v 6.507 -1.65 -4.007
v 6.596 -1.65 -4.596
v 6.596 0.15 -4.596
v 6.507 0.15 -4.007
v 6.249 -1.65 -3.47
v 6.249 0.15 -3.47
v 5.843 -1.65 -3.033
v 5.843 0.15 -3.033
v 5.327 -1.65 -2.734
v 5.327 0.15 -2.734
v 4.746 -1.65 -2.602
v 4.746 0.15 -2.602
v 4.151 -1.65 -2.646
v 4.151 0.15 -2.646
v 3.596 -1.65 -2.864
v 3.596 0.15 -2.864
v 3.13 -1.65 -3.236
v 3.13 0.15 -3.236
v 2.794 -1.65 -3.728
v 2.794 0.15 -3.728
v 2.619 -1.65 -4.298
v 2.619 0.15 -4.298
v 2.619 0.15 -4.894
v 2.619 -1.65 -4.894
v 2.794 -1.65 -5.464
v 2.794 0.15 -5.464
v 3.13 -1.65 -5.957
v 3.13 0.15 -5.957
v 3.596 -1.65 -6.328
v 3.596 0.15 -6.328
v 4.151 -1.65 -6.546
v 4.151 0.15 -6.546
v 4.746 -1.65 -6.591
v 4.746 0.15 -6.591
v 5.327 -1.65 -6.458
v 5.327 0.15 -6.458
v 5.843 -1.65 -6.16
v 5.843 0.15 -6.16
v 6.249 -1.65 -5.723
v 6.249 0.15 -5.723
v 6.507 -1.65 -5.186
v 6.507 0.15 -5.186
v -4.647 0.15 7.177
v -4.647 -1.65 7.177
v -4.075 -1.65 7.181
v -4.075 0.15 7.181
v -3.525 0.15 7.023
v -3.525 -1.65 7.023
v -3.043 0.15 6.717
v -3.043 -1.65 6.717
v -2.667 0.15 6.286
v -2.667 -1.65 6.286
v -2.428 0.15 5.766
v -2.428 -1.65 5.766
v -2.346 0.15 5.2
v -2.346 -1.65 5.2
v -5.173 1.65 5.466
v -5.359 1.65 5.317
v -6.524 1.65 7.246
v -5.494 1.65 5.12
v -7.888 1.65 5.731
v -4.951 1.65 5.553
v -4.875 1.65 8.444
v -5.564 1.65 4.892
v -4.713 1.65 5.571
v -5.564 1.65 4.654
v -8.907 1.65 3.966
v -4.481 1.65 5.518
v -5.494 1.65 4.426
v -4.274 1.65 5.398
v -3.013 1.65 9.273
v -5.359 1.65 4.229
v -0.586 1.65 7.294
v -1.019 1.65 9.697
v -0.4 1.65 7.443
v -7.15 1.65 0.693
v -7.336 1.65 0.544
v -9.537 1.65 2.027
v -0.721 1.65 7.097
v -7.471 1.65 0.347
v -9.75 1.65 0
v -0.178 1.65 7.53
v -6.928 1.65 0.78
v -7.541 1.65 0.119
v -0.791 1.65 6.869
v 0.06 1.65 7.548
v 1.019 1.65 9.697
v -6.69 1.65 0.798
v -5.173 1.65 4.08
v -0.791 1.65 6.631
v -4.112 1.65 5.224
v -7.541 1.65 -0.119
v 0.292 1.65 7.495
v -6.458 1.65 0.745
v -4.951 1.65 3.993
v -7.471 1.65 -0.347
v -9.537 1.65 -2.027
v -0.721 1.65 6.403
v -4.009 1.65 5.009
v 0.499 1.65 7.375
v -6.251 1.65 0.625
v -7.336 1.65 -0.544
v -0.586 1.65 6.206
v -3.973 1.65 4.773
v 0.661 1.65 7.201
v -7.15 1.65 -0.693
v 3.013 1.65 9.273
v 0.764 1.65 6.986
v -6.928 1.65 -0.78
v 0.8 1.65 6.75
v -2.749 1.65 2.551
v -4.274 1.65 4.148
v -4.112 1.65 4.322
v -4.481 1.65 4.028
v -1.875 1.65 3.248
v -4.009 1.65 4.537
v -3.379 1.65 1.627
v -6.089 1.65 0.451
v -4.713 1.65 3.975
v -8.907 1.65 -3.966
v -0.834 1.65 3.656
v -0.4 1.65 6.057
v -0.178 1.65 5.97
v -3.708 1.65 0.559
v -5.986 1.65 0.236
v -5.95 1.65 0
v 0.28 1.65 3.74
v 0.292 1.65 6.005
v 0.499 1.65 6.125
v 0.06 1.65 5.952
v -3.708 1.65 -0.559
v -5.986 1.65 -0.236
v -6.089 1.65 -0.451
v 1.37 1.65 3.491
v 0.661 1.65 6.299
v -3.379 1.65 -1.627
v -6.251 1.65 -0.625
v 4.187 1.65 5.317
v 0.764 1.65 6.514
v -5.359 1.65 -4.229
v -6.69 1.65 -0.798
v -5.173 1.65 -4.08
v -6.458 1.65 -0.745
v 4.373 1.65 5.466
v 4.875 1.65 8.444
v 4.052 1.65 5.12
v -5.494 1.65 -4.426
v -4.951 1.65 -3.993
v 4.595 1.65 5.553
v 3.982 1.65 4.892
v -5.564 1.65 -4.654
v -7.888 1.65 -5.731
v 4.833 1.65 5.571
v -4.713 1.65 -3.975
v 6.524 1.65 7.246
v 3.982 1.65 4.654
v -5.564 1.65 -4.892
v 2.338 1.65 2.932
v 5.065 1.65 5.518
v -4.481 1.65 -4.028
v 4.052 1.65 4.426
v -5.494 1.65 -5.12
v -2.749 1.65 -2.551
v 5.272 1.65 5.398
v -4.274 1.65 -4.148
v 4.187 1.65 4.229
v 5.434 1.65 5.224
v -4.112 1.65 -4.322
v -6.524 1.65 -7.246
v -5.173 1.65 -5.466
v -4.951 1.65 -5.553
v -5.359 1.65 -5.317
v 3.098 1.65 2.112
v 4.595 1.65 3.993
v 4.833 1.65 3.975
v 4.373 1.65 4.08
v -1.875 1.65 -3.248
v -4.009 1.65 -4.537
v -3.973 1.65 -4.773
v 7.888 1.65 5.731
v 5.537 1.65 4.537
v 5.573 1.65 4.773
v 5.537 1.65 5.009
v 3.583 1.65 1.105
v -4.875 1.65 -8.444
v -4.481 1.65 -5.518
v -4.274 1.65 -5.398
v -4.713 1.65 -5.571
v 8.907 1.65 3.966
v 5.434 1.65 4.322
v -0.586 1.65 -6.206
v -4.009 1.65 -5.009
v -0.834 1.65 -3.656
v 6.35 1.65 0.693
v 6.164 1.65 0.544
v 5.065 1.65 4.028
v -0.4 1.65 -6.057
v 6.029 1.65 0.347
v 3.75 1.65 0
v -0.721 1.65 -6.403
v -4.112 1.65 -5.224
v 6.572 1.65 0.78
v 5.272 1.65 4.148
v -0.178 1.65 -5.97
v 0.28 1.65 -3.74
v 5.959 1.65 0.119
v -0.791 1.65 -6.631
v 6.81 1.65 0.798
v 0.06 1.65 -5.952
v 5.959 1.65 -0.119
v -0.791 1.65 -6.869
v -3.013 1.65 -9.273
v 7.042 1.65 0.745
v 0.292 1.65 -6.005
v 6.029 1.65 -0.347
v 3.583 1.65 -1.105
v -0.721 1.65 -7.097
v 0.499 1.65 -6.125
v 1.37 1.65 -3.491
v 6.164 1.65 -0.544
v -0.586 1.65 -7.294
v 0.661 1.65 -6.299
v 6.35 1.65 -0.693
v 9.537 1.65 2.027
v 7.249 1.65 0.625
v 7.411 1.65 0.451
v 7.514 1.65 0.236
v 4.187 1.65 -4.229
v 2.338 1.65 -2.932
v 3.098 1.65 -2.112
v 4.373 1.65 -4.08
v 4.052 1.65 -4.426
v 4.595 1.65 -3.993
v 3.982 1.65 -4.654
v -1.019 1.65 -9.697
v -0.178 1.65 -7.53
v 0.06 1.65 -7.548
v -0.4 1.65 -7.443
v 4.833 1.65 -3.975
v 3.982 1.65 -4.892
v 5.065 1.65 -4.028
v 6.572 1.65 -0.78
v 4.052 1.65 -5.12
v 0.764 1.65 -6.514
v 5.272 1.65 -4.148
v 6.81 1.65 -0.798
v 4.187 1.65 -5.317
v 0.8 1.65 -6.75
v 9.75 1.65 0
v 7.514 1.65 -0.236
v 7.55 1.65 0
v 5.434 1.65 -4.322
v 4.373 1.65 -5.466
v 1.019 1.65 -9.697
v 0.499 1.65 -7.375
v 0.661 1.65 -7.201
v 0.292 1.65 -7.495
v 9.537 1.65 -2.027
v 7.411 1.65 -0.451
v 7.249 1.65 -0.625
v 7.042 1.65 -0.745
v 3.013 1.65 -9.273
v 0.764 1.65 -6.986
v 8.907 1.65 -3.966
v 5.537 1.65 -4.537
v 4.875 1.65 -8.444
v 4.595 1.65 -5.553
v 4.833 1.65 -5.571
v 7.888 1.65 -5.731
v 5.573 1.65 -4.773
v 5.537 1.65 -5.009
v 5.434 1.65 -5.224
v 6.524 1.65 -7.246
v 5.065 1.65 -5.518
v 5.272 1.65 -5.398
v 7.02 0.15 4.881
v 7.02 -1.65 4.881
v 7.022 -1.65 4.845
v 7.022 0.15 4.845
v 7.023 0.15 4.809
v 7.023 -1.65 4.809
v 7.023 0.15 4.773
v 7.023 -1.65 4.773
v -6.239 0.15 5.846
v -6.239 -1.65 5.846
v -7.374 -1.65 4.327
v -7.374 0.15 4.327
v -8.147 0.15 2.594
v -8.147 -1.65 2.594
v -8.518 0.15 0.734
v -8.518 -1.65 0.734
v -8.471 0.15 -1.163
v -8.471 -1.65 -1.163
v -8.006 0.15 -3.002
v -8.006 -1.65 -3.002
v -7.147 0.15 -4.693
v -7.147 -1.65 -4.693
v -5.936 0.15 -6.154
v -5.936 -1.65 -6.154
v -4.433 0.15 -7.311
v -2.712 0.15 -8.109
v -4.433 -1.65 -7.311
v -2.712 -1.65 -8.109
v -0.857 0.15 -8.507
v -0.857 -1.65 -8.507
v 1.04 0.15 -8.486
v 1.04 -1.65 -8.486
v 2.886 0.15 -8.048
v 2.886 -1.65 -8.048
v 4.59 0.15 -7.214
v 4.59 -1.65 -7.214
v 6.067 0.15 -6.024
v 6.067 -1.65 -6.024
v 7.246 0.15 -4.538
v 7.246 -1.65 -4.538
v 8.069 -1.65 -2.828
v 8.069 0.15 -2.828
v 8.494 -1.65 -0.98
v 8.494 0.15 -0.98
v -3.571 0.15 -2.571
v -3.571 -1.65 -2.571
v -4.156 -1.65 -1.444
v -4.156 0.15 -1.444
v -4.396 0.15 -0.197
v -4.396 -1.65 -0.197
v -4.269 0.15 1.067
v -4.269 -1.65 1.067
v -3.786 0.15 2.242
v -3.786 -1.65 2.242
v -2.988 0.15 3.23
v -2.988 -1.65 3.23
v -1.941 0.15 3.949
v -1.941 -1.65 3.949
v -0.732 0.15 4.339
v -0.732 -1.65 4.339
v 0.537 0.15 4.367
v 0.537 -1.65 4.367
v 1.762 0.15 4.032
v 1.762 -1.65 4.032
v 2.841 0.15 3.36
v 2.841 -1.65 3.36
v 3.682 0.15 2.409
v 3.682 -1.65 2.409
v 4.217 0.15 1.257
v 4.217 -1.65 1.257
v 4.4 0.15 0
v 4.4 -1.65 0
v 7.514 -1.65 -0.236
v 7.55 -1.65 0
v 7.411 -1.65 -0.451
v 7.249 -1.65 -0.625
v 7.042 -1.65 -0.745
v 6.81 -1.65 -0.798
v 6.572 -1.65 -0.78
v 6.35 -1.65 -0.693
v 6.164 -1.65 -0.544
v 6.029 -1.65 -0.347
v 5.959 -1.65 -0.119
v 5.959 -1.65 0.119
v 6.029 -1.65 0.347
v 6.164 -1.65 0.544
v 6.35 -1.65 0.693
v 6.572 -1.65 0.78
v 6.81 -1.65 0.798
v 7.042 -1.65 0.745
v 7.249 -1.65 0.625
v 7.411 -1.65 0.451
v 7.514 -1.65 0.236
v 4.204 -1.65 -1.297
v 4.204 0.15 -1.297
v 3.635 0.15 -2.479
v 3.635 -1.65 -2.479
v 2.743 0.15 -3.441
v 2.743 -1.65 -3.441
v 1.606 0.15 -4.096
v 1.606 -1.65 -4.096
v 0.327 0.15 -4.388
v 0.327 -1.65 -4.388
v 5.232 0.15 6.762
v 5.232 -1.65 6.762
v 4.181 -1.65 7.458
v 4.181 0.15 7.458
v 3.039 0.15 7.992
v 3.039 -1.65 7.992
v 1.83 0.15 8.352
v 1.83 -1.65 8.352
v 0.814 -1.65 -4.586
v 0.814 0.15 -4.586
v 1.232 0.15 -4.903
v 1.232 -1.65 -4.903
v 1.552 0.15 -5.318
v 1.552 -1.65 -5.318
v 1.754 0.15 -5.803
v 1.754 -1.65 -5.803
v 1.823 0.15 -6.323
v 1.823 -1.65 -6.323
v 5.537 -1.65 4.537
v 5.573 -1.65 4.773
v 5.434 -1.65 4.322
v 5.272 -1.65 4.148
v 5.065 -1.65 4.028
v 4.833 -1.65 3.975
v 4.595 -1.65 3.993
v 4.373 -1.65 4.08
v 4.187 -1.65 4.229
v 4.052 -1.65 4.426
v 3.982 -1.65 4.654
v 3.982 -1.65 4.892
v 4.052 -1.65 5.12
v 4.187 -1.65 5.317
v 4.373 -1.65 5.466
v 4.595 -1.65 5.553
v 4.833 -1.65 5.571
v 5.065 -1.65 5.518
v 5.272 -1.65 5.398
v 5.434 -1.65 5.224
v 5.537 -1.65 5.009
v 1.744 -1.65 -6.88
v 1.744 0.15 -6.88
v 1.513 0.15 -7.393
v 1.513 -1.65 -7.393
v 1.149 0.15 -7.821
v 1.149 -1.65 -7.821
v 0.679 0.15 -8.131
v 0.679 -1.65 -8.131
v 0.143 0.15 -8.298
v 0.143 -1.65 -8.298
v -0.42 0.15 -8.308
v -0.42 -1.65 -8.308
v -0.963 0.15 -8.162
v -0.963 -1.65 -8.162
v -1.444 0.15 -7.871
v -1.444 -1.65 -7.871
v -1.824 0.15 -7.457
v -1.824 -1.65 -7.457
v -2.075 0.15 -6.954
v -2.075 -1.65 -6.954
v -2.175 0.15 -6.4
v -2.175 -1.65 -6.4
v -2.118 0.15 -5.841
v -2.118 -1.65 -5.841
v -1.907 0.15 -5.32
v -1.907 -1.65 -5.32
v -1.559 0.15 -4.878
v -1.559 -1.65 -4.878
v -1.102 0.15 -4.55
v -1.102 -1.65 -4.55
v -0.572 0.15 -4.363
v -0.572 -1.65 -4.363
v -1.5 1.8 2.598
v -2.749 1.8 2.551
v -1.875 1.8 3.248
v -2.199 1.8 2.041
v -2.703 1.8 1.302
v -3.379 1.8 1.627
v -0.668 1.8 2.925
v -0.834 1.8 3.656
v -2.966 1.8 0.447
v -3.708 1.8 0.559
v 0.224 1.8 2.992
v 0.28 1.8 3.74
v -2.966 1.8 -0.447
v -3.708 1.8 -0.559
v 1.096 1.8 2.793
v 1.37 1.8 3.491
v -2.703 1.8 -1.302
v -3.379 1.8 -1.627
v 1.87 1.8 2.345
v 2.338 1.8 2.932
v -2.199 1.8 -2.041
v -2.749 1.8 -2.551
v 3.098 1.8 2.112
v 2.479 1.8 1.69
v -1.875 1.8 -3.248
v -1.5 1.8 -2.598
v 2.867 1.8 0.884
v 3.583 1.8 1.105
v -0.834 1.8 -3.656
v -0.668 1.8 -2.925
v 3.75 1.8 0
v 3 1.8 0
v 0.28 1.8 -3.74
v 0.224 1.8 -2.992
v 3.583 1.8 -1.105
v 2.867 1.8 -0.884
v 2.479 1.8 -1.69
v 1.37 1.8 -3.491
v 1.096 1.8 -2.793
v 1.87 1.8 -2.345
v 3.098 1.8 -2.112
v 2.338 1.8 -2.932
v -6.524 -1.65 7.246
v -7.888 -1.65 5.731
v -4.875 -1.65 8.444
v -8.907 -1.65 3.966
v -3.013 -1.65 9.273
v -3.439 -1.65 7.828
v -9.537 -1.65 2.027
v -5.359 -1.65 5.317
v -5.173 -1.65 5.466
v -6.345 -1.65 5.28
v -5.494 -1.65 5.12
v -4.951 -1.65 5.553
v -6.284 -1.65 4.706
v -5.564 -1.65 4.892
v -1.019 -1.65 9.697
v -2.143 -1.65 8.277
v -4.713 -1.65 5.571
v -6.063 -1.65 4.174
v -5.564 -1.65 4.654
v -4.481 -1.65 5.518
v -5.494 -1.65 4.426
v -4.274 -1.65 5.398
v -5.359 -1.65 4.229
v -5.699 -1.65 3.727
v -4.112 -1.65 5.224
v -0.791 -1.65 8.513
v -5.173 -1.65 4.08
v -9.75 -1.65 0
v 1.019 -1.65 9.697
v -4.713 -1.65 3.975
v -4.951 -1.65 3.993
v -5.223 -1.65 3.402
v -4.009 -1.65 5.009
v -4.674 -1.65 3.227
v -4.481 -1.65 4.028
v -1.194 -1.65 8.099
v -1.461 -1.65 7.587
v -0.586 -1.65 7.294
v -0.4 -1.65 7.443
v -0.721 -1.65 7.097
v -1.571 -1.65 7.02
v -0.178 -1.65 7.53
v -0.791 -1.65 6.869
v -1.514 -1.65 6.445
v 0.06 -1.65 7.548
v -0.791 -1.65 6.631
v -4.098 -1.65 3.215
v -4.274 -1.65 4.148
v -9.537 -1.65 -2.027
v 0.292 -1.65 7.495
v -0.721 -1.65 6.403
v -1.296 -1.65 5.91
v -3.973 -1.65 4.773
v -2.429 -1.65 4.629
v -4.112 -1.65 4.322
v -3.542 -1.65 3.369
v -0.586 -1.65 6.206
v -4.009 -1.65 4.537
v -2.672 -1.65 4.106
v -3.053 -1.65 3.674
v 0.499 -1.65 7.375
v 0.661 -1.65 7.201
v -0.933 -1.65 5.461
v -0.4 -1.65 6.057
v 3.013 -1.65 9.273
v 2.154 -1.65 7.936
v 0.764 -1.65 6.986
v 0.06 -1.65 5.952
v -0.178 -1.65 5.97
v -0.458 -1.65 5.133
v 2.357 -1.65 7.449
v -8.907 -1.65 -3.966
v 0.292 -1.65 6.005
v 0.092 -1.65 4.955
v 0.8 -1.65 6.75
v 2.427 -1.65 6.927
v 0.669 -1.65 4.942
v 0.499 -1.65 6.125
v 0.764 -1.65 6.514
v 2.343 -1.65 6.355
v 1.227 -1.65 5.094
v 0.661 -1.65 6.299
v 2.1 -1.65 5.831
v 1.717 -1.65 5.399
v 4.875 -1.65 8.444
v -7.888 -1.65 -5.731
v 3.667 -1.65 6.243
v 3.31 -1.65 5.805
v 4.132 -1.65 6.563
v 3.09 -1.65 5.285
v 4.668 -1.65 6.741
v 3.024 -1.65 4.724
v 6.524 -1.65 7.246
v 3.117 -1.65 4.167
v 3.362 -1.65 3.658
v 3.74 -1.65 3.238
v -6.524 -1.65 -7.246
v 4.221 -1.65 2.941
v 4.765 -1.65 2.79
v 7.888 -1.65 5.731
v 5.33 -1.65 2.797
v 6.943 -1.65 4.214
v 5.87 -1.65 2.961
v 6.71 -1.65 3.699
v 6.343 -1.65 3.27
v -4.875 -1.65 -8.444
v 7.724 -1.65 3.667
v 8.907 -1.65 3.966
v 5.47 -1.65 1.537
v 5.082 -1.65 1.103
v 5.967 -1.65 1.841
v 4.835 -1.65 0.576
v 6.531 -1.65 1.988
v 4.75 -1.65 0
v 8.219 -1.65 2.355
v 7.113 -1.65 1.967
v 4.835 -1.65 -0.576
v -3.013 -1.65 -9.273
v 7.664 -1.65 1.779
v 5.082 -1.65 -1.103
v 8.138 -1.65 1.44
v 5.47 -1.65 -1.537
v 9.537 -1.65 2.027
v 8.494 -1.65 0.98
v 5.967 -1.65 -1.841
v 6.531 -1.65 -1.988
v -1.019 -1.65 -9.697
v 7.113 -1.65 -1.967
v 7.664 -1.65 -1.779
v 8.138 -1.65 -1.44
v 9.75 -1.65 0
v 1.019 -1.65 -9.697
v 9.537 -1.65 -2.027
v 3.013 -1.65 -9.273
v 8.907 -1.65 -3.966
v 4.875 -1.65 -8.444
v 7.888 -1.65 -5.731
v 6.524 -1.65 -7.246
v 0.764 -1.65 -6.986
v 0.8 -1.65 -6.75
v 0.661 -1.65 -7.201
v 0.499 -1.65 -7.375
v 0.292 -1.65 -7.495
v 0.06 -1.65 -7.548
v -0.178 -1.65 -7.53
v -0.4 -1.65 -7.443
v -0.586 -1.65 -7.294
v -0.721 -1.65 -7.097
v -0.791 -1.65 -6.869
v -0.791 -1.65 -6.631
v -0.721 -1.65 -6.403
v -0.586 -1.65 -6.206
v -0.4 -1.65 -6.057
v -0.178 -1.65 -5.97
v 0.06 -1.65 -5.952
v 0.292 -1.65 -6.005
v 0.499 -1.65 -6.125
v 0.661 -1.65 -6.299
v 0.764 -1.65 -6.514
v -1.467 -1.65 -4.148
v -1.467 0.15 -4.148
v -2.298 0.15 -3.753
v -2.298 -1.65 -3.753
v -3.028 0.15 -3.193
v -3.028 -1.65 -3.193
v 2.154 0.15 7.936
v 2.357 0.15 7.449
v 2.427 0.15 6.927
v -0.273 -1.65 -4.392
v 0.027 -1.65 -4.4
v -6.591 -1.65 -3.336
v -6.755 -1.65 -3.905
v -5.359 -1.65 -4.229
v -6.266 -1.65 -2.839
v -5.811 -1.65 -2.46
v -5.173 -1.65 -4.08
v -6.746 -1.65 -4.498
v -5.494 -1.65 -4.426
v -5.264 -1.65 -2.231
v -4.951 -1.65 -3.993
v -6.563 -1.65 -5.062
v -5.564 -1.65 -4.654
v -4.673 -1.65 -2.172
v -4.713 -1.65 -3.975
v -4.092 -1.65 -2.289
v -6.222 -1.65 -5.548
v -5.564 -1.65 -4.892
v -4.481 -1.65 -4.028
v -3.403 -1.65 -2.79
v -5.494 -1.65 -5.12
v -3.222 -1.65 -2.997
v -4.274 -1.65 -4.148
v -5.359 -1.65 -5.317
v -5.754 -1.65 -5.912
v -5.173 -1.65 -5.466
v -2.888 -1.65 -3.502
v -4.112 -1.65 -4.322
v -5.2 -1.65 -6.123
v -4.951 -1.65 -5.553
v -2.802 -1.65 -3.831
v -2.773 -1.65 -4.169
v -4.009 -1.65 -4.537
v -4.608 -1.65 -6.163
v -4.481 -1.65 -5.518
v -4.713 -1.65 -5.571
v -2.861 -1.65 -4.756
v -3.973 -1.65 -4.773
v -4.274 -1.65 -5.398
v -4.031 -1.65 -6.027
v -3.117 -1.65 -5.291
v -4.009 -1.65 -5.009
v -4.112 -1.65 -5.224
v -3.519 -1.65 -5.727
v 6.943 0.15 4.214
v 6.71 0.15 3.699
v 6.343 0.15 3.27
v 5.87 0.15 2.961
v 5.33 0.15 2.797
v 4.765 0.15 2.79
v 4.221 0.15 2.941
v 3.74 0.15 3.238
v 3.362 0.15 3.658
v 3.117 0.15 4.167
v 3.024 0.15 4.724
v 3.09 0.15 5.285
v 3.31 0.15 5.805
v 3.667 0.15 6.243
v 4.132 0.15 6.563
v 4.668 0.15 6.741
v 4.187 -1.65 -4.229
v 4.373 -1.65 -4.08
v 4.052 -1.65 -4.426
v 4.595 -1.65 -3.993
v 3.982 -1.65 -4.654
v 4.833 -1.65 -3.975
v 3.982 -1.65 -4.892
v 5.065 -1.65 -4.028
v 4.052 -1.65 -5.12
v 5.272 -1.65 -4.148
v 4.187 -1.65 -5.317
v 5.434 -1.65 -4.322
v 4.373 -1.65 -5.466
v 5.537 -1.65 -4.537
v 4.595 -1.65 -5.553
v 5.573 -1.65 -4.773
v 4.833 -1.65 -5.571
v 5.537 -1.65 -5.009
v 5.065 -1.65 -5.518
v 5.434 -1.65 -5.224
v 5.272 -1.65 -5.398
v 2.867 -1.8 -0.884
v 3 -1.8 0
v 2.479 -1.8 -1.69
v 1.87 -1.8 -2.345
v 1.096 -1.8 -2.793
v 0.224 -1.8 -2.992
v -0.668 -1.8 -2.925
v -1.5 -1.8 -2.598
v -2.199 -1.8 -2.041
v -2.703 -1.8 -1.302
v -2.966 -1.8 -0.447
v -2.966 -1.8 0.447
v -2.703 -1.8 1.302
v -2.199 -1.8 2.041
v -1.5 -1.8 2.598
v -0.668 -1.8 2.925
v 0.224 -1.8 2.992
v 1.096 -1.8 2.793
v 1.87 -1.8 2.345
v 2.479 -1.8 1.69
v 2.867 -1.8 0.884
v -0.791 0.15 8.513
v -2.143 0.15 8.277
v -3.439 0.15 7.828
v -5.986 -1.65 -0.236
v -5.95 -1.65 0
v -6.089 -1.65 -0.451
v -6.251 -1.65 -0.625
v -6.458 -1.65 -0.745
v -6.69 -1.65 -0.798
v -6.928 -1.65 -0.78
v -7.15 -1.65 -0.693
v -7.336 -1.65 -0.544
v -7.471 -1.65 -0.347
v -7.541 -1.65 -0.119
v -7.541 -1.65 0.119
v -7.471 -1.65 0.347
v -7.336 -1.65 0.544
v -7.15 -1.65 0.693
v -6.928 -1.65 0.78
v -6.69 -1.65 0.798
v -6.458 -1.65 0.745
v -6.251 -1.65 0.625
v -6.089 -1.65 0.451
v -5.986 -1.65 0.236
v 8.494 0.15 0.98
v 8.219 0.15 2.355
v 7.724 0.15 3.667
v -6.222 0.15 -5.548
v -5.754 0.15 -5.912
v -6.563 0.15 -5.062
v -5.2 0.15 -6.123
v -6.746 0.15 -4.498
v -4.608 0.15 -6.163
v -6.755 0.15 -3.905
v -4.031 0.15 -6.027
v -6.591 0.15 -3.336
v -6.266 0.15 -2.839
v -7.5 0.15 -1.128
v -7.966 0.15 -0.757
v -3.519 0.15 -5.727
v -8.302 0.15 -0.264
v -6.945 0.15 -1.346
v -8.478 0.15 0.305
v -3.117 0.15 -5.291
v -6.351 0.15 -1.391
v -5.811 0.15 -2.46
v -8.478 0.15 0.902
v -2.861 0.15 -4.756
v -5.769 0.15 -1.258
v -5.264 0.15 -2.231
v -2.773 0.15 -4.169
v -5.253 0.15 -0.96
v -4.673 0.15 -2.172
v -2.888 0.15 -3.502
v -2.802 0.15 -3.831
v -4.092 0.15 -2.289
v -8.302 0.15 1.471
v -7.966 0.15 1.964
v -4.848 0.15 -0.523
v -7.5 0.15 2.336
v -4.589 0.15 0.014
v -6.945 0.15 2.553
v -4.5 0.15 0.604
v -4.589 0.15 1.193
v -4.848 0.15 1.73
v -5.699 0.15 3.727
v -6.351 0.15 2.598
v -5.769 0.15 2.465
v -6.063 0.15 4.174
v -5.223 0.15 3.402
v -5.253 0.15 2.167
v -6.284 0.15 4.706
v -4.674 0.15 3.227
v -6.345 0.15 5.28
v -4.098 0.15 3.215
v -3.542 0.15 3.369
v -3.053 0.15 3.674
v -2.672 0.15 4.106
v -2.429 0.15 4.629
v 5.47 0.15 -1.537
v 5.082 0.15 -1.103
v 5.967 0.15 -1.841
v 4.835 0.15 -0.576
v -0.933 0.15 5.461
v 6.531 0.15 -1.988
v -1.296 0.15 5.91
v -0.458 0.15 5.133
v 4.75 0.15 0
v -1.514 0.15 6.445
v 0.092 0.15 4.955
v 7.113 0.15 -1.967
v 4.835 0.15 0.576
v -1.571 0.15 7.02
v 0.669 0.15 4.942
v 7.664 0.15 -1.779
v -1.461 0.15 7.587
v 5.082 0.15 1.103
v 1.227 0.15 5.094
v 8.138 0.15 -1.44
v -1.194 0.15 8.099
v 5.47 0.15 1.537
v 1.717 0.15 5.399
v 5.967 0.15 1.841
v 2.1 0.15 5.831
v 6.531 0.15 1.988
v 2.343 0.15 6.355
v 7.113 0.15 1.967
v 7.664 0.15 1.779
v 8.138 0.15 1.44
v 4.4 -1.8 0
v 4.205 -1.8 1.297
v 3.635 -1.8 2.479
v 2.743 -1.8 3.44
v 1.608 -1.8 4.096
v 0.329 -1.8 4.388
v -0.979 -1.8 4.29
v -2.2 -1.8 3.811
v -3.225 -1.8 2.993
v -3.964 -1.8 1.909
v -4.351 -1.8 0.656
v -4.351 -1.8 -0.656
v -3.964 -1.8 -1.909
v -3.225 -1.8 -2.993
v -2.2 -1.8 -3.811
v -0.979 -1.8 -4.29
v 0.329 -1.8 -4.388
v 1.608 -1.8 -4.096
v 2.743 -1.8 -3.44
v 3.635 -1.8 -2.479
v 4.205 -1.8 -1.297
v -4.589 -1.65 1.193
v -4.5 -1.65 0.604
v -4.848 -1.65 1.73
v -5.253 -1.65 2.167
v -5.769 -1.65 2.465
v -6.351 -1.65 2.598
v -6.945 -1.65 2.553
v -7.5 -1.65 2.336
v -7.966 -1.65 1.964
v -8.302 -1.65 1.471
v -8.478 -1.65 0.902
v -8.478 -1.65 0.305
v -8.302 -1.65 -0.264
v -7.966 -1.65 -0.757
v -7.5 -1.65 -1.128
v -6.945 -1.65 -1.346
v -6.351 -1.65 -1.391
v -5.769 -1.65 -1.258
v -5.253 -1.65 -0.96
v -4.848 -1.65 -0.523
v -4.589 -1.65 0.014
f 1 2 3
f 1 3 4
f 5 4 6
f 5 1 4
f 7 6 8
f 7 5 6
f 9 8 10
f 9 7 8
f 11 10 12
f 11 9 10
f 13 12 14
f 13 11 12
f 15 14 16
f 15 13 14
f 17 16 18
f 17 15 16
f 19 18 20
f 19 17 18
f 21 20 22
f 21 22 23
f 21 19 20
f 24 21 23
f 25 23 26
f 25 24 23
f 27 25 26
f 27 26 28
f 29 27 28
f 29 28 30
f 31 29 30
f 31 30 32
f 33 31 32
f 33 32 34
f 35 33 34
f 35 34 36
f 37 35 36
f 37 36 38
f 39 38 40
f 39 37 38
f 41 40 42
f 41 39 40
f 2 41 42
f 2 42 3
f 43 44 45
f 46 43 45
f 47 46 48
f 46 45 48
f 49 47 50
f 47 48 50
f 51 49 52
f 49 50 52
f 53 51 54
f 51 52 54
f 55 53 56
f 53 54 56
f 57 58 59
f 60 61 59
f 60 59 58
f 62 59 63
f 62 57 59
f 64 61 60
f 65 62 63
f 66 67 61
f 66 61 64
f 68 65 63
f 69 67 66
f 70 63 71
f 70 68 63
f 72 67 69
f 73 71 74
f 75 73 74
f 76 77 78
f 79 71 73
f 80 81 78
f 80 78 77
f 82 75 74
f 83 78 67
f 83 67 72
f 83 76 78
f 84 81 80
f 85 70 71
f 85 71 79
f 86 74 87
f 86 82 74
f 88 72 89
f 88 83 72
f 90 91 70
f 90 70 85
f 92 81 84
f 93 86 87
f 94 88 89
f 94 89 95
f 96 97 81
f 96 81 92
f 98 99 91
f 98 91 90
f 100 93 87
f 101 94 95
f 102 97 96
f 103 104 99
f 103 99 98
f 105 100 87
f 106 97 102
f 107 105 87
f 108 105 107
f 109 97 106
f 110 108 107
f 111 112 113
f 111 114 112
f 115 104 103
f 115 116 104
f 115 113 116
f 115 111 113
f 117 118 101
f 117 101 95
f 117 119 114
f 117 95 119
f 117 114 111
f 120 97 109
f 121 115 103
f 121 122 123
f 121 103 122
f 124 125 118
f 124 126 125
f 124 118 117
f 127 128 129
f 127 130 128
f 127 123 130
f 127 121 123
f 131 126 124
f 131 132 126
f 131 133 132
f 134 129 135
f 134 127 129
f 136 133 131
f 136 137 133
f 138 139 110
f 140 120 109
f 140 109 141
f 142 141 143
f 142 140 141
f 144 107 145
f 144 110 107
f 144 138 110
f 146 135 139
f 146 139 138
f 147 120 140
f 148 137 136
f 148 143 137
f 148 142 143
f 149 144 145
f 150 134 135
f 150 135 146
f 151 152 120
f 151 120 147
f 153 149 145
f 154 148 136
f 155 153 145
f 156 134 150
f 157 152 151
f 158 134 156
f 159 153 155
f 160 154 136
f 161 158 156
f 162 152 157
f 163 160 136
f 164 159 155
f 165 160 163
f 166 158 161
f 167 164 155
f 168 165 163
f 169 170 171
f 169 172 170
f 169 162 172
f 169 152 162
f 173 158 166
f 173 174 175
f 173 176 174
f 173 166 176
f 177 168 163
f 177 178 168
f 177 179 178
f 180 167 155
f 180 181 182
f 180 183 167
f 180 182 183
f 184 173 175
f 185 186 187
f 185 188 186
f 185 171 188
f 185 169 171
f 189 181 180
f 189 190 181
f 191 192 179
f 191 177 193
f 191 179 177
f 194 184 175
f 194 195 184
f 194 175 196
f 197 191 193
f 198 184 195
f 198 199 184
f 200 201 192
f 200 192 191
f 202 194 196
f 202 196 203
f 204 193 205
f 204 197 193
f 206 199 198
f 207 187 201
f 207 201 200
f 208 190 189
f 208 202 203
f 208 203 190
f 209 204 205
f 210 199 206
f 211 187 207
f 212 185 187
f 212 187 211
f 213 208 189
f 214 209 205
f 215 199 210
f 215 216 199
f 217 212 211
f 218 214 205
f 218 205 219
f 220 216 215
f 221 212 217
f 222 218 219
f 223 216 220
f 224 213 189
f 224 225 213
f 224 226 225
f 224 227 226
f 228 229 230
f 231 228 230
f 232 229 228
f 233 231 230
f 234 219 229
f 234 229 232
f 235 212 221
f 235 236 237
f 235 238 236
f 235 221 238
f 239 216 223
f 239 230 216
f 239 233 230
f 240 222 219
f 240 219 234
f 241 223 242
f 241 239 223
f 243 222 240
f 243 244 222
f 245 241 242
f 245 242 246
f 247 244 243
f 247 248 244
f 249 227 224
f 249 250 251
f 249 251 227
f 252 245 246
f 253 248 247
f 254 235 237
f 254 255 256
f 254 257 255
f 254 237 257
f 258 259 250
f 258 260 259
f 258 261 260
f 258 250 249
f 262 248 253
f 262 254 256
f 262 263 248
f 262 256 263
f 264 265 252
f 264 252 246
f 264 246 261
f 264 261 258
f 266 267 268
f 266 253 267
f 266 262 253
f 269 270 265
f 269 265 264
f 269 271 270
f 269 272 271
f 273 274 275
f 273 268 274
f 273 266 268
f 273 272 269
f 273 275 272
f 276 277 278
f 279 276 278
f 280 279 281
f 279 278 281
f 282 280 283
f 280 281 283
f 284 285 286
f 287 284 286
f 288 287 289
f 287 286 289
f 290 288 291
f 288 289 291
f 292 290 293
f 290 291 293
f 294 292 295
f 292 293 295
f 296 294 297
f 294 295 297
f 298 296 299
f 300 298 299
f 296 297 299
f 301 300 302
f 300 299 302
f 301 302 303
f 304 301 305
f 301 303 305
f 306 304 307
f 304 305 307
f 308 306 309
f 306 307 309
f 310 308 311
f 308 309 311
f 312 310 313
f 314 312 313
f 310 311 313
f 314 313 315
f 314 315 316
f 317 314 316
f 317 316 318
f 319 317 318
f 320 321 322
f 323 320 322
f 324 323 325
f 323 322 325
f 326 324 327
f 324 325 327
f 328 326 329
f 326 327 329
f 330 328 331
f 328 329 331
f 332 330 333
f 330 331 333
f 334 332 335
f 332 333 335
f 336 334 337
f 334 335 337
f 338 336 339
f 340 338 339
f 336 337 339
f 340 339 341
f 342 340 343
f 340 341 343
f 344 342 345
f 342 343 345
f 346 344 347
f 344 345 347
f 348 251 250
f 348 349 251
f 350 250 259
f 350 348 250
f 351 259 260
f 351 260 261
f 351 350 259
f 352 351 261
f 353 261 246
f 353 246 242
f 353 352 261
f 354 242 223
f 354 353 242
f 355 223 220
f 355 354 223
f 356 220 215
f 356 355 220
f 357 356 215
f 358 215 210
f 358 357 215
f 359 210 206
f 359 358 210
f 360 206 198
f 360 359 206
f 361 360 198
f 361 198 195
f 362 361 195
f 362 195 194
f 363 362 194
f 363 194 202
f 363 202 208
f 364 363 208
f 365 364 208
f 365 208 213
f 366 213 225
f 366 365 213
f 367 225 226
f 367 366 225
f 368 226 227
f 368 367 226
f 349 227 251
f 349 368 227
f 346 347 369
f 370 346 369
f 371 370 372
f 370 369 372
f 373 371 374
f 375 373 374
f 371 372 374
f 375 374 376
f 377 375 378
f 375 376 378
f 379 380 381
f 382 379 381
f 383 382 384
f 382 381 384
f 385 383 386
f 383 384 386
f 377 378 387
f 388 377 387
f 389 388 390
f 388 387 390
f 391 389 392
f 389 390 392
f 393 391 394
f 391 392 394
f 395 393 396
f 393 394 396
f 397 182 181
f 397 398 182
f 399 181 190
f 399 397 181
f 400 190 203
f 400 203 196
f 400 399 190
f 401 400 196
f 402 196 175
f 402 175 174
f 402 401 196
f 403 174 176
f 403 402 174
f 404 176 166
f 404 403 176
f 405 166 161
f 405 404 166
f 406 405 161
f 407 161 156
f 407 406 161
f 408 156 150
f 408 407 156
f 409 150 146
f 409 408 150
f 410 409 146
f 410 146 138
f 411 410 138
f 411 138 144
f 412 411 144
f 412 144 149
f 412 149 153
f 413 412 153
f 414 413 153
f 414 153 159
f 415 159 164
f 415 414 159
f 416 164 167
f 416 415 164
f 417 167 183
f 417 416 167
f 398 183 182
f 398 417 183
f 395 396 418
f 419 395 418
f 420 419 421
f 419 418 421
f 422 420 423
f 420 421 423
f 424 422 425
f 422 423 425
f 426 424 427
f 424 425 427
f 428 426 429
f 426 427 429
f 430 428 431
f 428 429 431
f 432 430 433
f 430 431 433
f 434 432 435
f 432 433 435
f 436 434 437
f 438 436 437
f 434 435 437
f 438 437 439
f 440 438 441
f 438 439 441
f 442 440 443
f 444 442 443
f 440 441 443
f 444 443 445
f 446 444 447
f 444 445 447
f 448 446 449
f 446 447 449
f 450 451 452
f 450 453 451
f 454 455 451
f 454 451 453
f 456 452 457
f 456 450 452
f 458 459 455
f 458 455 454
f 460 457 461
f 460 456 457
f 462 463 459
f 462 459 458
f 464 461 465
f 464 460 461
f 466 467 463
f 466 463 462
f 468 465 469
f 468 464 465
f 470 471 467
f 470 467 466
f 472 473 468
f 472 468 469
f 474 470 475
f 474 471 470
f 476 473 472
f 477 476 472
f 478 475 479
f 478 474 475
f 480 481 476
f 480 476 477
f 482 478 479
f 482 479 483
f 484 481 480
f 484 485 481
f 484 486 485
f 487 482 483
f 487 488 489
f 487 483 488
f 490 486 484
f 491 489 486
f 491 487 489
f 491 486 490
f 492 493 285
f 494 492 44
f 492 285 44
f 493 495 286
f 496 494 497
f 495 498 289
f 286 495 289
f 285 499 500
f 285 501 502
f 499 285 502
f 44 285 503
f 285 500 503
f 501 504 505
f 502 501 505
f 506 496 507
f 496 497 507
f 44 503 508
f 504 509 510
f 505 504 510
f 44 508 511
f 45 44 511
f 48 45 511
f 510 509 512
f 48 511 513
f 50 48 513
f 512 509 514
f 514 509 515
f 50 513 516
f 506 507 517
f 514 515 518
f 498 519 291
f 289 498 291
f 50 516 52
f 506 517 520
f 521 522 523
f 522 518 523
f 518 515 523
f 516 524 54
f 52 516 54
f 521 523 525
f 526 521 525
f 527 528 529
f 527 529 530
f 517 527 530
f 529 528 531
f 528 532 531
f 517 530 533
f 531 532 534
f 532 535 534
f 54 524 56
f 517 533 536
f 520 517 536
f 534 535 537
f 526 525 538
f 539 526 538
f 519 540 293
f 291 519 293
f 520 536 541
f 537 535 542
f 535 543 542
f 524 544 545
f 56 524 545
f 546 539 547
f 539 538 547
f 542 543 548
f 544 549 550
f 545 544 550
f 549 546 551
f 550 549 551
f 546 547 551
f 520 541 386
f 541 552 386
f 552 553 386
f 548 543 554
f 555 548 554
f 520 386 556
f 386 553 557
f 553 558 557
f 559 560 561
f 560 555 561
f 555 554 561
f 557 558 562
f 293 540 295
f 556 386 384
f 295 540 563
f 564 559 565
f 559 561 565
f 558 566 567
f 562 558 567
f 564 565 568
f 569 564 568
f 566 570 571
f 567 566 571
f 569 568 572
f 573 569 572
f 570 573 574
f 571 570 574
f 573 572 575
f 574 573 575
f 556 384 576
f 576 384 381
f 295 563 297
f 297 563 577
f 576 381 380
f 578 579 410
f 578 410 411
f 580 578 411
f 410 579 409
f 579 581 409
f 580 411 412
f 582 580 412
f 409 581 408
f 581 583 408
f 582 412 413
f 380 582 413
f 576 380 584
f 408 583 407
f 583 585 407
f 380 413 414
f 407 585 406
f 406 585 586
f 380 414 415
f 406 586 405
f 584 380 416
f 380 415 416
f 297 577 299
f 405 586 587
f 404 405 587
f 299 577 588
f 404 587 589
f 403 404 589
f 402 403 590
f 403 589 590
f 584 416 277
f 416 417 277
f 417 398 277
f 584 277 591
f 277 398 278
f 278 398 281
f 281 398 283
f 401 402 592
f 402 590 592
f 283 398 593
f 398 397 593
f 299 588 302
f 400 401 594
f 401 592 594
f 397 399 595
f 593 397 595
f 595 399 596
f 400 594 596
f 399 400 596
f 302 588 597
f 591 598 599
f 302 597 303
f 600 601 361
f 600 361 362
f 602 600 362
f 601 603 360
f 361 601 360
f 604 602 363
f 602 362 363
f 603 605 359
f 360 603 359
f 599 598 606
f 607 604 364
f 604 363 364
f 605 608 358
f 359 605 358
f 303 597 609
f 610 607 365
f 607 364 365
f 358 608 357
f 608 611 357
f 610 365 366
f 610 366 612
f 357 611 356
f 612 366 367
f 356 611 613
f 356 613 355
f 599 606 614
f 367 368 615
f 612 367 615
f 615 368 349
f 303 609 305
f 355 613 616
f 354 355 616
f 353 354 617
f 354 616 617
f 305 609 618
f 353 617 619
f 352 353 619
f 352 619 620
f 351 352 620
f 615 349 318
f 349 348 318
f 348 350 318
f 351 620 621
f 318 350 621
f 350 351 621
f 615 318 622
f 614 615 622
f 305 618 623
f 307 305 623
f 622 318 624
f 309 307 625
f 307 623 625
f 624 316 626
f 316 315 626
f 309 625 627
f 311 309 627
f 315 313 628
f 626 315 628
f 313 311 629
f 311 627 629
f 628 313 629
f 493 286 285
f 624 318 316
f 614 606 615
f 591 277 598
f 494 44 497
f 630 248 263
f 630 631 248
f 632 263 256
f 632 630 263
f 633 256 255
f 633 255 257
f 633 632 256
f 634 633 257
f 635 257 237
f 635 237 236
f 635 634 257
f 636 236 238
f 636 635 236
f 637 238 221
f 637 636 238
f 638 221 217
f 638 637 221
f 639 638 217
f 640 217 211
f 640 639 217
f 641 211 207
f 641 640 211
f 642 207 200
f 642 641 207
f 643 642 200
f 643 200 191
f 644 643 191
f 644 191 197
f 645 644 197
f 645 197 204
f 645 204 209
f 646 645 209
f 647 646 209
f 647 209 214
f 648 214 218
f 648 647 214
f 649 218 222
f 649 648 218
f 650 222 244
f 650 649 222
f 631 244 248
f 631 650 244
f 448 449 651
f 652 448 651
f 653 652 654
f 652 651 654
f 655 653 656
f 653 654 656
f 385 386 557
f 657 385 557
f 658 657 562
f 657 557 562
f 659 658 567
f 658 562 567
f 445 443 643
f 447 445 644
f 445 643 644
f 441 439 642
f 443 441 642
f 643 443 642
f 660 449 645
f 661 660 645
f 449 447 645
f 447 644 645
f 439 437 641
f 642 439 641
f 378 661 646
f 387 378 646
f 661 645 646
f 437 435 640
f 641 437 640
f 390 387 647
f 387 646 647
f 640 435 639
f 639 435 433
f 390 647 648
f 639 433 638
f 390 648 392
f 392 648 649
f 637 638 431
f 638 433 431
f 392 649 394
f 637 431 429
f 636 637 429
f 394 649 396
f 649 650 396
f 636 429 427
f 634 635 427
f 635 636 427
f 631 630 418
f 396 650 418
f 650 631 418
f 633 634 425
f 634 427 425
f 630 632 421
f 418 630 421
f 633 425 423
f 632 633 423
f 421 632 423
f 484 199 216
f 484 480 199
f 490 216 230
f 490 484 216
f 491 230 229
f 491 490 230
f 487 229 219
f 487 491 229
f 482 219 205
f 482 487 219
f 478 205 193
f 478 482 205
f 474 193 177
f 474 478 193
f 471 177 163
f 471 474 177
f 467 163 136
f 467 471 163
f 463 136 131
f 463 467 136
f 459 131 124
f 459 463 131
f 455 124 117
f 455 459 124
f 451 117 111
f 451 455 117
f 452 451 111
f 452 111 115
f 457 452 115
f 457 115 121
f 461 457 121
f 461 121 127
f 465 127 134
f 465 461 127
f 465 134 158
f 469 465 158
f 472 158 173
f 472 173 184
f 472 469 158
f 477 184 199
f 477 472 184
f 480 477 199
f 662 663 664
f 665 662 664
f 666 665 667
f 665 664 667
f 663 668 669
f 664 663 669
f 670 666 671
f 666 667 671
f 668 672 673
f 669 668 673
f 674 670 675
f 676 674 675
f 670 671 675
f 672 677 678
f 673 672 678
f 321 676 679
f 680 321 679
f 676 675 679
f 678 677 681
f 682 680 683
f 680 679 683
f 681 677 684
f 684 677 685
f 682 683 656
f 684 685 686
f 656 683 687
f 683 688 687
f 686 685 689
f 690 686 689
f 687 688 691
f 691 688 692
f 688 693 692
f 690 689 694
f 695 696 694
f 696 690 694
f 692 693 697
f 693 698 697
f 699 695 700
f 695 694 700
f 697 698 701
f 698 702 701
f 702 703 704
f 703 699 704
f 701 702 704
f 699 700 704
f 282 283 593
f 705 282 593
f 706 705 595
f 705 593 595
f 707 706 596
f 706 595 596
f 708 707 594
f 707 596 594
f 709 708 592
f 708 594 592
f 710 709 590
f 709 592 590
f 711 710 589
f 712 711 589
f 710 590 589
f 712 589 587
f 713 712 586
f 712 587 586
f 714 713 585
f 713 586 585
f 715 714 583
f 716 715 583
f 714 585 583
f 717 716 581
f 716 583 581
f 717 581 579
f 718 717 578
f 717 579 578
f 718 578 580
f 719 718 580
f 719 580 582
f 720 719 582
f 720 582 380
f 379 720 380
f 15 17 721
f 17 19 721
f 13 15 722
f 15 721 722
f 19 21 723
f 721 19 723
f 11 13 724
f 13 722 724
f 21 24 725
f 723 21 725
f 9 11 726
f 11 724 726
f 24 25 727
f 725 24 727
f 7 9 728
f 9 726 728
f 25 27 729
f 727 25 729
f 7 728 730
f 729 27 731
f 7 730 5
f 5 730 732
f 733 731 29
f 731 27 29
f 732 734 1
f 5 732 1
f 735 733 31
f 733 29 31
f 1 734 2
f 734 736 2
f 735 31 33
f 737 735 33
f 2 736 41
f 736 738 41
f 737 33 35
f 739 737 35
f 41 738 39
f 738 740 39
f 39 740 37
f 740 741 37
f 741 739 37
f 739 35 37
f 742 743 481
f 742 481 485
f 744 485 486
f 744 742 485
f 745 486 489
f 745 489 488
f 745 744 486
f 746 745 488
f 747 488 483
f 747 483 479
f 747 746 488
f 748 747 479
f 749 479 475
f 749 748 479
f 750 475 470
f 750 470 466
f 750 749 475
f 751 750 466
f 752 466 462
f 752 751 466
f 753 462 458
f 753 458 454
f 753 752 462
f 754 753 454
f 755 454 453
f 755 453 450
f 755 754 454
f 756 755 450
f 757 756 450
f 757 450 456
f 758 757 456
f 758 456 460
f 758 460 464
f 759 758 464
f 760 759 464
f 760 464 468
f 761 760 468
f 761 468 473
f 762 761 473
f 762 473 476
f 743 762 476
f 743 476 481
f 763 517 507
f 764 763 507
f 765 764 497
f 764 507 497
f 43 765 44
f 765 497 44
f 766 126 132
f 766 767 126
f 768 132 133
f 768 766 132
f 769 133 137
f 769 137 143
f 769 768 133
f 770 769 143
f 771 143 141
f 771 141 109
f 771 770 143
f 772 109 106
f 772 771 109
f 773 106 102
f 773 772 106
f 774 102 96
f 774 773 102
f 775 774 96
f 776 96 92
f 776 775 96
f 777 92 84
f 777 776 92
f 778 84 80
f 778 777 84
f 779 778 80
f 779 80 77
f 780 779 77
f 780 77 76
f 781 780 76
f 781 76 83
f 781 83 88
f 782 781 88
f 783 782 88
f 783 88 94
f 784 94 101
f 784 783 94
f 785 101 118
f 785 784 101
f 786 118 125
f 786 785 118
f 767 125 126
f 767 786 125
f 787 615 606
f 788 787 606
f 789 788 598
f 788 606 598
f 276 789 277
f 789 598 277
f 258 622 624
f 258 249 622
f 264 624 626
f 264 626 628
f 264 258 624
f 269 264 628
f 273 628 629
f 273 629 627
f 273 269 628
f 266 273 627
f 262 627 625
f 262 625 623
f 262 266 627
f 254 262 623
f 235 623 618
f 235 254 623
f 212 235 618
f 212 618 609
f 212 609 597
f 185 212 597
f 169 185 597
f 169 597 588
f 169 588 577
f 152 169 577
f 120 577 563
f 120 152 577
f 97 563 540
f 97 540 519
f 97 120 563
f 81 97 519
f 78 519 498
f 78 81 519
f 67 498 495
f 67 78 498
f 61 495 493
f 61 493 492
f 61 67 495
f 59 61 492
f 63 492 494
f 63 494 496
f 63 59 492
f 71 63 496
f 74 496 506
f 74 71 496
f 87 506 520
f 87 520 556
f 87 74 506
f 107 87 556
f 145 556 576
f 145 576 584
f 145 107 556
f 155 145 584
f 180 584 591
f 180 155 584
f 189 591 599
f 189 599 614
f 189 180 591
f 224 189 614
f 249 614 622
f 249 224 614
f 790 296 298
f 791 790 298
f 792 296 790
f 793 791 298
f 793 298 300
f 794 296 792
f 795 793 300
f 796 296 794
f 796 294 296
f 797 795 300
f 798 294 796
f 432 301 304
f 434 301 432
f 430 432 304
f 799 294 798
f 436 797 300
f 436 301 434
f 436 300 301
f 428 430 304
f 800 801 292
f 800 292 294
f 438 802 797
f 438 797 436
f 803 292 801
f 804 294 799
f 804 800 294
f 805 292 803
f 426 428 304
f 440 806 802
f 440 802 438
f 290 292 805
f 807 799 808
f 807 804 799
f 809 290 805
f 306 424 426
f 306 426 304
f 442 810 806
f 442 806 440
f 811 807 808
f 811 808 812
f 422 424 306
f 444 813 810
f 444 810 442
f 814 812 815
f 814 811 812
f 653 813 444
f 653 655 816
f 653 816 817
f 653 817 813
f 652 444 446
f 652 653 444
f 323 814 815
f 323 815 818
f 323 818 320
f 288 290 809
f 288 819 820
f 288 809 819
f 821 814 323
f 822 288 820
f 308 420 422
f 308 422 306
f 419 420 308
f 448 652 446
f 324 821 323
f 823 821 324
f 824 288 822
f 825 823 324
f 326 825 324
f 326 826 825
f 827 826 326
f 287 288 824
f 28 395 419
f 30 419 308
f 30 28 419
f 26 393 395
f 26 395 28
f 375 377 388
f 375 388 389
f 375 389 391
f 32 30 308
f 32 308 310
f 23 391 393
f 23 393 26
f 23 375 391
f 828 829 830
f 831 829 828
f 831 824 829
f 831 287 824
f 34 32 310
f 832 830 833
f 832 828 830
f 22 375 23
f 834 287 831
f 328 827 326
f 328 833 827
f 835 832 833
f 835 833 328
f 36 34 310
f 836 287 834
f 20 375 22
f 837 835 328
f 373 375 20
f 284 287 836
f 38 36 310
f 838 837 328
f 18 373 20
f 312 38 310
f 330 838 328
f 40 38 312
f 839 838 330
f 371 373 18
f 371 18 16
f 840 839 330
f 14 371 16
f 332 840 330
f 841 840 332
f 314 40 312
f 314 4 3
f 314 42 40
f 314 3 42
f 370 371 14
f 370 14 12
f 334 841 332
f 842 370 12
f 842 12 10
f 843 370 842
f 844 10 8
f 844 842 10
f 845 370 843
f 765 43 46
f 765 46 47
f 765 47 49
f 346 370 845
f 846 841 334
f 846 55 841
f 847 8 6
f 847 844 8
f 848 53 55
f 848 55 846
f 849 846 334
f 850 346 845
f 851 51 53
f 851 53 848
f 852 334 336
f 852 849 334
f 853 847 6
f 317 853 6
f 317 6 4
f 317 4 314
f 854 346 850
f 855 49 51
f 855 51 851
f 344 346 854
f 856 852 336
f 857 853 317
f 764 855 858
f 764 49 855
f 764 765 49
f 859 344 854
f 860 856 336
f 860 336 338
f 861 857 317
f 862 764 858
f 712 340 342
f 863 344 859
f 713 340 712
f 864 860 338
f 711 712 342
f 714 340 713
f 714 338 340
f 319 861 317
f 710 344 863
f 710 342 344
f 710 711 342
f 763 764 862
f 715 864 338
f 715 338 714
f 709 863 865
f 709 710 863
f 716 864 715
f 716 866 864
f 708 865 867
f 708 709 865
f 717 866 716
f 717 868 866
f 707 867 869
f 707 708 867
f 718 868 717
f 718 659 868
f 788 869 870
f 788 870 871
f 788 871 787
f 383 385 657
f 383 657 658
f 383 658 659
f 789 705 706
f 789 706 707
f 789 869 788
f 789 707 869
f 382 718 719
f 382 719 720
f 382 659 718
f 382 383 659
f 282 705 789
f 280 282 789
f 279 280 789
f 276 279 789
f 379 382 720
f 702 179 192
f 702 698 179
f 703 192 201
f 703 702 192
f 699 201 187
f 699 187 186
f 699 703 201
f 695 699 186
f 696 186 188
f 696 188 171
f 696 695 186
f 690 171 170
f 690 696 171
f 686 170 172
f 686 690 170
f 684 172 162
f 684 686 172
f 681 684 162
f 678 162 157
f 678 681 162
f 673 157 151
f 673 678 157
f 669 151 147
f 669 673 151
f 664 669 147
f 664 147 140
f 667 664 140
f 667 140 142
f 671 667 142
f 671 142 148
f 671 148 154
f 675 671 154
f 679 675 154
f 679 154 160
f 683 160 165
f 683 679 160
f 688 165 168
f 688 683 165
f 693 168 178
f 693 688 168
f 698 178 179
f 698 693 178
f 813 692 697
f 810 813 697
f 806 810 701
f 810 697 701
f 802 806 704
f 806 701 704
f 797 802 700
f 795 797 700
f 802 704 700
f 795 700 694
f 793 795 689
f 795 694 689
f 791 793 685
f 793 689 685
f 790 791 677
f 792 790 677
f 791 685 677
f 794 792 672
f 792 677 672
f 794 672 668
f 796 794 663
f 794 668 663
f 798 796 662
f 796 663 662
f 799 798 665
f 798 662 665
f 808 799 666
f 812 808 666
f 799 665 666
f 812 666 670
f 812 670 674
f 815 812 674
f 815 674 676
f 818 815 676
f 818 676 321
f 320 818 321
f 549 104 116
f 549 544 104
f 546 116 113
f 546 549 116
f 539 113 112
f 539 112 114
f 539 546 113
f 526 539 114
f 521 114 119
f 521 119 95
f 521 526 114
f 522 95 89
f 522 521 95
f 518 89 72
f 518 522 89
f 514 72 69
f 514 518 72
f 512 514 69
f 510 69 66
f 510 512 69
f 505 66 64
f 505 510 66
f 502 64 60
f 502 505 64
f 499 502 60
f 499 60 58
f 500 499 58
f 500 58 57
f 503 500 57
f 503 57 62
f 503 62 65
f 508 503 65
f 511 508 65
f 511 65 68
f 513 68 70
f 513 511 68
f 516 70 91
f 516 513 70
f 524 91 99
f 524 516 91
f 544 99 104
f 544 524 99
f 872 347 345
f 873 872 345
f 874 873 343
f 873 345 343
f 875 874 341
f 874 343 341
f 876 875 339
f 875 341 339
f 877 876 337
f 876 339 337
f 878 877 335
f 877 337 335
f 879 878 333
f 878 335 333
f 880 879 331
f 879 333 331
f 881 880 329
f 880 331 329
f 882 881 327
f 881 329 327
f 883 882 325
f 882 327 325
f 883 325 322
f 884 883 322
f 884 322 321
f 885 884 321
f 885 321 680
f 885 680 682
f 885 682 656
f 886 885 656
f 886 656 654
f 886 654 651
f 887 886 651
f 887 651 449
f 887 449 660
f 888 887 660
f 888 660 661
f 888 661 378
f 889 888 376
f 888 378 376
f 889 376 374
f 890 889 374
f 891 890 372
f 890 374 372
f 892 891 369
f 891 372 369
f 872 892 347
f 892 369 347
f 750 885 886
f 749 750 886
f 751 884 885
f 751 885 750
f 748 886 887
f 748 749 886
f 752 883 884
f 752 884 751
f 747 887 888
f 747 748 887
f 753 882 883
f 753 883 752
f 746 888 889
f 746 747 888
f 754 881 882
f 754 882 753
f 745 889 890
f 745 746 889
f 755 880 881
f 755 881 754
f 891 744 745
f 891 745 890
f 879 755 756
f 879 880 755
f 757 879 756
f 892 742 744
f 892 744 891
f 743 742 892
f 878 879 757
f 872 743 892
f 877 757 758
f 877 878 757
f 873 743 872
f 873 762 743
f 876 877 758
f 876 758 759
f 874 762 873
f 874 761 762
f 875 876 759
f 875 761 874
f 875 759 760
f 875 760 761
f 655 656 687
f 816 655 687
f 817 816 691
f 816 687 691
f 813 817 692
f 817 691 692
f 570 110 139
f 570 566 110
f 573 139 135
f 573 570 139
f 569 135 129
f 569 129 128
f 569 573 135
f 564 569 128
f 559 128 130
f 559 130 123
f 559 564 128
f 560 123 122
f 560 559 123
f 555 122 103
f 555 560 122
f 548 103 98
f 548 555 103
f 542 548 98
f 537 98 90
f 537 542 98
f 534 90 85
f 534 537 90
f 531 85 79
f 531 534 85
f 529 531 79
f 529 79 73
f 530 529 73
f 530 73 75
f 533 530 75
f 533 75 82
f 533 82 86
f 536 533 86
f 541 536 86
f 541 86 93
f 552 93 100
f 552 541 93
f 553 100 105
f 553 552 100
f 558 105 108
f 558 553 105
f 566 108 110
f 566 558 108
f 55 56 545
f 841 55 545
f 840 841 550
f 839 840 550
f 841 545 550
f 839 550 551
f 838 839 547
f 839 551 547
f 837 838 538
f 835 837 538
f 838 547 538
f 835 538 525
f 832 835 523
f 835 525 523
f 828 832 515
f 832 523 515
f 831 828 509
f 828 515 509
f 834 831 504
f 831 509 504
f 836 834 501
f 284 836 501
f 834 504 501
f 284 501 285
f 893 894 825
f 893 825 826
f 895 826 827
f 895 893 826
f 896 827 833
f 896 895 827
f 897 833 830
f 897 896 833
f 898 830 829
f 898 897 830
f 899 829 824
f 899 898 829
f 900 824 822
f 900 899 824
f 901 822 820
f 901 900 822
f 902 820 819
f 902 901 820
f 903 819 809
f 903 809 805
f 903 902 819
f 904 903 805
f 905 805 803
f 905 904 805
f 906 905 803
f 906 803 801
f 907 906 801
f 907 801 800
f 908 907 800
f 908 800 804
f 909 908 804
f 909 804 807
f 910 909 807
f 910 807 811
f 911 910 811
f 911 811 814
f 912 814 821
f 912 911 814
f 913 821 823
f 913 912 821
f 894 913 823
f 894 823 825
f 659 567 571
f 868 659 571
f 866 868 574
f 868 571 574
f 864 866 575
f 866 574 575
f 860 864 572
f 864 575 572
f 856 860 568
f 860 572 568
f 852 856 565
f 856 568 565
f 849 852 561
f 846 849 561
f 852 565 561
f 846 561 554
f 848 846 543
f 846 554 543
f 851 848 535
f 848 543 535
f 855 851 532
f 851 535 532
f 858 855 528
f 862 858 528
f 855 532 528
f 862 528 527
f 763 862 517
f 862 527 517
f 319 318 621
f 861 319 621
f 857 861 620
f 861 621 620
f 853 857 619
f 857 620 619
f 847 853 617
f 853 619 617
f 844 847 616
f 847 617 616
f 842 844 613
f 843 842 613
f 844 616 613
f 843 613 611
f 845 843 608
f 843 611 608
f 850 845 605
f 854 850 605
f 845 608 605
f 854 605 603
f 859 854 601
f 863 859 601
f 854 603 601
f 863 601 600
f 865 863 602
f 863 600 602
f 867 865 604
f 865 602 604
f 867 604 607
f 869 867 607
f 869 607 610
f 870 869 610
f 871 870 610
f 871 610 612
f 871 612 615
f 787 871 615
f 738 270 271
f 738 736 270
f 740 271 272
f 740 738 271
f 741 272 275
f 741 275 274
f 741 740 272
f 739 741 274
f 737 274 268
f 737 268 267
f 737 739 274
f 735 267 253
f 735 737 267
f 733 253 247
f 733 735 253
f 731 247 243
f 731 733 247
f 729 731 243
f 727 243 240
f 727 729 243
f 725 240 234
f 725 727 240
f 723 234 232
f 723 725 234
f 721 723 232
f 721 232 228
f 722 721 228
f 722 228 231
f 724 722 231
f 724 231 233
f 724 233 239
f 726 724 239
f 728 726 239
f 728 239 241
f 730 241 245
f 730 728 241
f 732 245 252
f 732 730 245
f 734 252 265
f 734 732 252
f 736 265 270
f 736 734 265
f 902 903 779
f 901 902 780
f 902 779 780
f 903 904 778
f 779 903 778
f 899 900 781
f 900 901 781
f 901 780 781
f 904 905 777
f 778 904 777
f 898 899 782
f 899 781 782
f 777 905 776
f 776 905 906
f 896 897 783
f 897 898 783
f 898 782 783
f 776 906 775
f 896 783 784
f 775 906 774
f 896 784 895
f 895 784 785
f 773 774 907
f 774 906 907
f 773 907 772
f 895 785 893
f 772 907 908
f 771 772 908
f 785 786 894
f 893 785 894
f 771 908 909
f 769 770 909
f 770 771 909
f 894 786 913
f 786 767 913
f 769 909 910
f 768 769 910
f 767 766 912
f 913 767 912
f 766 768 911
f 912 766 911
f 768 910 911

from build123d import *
from build123d.topology import SkipClean

# Parameters (mm, degrees)
CROQUIS1_R              = 9.75
CROQUIS1_R_2            = 0.8
CROQUIS1_R_3            = 3
SALIENTE_EXTRUIR1_DEPTH = 1.65
CROQUIS1_3_R            = 3.75
CROQUIS1_3_R_2          = 3
SALIENTE_EXTRUIR2_DEPTH = 1.8
CROQUIS2_R              = 2
CORTAR_EXTRUIR3_DEPTH   = 1.8
SALIENTE_EXTRUIR3_START = 0.15
CROQUIS3_R              = 4.4
CROQUIS3_R_2            = 3
SALIENTE_EXTRUIR3_DEPTH = 0.15


with BuildPart() as part:
    # Croquis1 → Saliente-Extruir1 (new, symmetric)
    with BuildSketch(Plane(origin=(0, 0, 0), x_dir=(1, 0, 0), z_dir=(0, 1, 0))):
        Circle(CROQUIS1_R)
        with Locations((-4.772970773, -4.772970773)):
            Circle(CROQUIS1_R_2, mode=Mode.SUBTRACT)
        with Locations((0, -6.75)):
            Circle(CROQUIS1_R_2, mode=Mode.SUBTRACT)
        with Locations((4.772970773, -4.772970773)):
            Circle(CROQUIS1_R_2, mode=Mode.SUBTRACT)
        with Locations((-6.75, 0)):
            Circle(CROQUIS1_R_2, mode=Mode.SUBTRACT)
        with Locations((-4.772970773, 4.772970773)):
            Circle(CROQUIS1_R_2, mode=Mode.SUBTRACT)
        with Locations((4.772970773, 4.772970773)):
            Circle(CROQUIS1_R_2, mode=Mode.SUBTRACT)
        with Locations((6.75, 0)):
            Circle(CROQUIS1_R_2, mode=Mode.SUBTRACT)
        with Locations((0, 6.75)):
            Circle(CROQUIS1_R_2, mode=Mode.SUBTRACT)
        Circle(CROQUIS1_R_3, mode=Mode.SUBTRACT)
    extrude(amount=SALIENTE_EXTRUIR1_DEPTH, both=True)

    # Croquis1<3> → Saliente-Extruir2 (add, symmetric)
    with BuildSketch(Plane(origin=(0, 0, 0), x_dir=(1, 0, 0), z_dir=(0, 1, 0))):
        Circle(CROQUIS1_3_R)
        Circle(CROQUIS1_3_R_2, mode=Mode.SUBTRACT)
    extrude(amount=SALIENTE_EXTRUIR2_DEPTH, both=True)

    # Croquis2 → Cortar-Extruir3 (cut)
    with BuildSketch(Plane.XZ.offset(1.65)):
        with BuildLine():
            ThreePointArc((8.493703704, -0.979539378), (4.75, 0), (8.493703704, 0.979539378))
            ThreePointArc((8.493703704, 0.979539378), (7.998376267, 3.021336972), (7.02006773, 4.880691454))
            ThreePointArc((7.02006773, 4.880691454), (7.02224488, 4.826850669), (7.022970773, 4.772970773))
            ThreePointArc((7.022970773, 4.772970773), (3.536549224, 3.434856062), (5.232419794, 6.761973314))
            ThreePointArc((5.232419794, 6.761973314), (3.619603246, 7.746029457), (1.830044014, 8.351852424))
            ThreePointArc((1.830044014, 8.351852424), (2.27157135, 7.69926144), (2.426776695, 6.926776695))
            ThreePointArc((2.426776695, 6.926776695), (-0.457693454, 5.132978336), (-0.79093586, 8.513337798))
            ThreePointArc((-0.79093586, 8.513337798), (-2.79976514, 8.078602303), (-4.646803784, 7.177026863))
            ThreePointArc((-4.646803784, 7.177026863), (-3.042587429, 6.716523558), (-2.346194078, 5.199747468))
            ThreePointArc((-2.346194078, 5.199747468), (-4.673942073, 3.226784911), (-6.238775329, 5.846381992))
            ThreePointArc((-6.238775329, 5.846381992), (-3.594367278, -7.757771837), (8.493703704, -0.979539378))
        make_face()
        with BuildLine():
            ThreePointArc((0.327362602, -4.387805115), (1.405670554, -5.100169462), (1.823223305, -6.323223305))
            ThreePointArc((1.823223305, -6.323223305), (-1.443575646, -7.870873271), (-0.571997114, -4.362661951))
            ThreePointArc((-0.571997114, -4.362661951), (-1.892548808, -3.972185671), (-3.027723734, -3.192630419))
            ThreePointArc((-3.027723734, -3.192630419), (-2.837706698, -3.6646868), (-2.772970773, -4.169417382))
            ThreePointArc((-2.772970773, -4.169417382), (-6.562508569, -5.062476438), (-3.57052525, -2.571254448))
            ThreePointArc((-3.57052525, -2.571254448), (-1.350868035, 4.187499917), (4.4, 0))
            ThreePointArc((4.4, 0), (3.224933755, -2.993292882), (0.327362602, -4.387805115))
        make_face(mode=Mode.SUBTRACT)
        with Locations((4.596194078, -4.596194078)):
            Circle(CROQUIS2_R, mode=Mode.SUBTRACT)
        with Locations((-6.5, 0.603553391)):
            Circle(CROQUIS2_R, mode=Mode.SUBTRACT)
    extrude(amount=-CORTAR_EXTRUIR3_DEPTH, mode=Mode.SUBTRACT)

    # Croquis3 → Saliente-Extruir3 (add)
    with SkipClean():  # the faces are left unmerged after this step: merging them gives an invalid solid
        with BuildSketch(Plane.XZ.offset(1.65).offset(SALIENTE_EXTRUIR3_START)):
            Circle(CROQUIS3_R)
            Circle(CROQUIS3_R_2, mode=Mode.SUBTRACT)
        extrude(amount=-SALIENTE_EXTRUIR3_DEPTH)


solid = part.part
